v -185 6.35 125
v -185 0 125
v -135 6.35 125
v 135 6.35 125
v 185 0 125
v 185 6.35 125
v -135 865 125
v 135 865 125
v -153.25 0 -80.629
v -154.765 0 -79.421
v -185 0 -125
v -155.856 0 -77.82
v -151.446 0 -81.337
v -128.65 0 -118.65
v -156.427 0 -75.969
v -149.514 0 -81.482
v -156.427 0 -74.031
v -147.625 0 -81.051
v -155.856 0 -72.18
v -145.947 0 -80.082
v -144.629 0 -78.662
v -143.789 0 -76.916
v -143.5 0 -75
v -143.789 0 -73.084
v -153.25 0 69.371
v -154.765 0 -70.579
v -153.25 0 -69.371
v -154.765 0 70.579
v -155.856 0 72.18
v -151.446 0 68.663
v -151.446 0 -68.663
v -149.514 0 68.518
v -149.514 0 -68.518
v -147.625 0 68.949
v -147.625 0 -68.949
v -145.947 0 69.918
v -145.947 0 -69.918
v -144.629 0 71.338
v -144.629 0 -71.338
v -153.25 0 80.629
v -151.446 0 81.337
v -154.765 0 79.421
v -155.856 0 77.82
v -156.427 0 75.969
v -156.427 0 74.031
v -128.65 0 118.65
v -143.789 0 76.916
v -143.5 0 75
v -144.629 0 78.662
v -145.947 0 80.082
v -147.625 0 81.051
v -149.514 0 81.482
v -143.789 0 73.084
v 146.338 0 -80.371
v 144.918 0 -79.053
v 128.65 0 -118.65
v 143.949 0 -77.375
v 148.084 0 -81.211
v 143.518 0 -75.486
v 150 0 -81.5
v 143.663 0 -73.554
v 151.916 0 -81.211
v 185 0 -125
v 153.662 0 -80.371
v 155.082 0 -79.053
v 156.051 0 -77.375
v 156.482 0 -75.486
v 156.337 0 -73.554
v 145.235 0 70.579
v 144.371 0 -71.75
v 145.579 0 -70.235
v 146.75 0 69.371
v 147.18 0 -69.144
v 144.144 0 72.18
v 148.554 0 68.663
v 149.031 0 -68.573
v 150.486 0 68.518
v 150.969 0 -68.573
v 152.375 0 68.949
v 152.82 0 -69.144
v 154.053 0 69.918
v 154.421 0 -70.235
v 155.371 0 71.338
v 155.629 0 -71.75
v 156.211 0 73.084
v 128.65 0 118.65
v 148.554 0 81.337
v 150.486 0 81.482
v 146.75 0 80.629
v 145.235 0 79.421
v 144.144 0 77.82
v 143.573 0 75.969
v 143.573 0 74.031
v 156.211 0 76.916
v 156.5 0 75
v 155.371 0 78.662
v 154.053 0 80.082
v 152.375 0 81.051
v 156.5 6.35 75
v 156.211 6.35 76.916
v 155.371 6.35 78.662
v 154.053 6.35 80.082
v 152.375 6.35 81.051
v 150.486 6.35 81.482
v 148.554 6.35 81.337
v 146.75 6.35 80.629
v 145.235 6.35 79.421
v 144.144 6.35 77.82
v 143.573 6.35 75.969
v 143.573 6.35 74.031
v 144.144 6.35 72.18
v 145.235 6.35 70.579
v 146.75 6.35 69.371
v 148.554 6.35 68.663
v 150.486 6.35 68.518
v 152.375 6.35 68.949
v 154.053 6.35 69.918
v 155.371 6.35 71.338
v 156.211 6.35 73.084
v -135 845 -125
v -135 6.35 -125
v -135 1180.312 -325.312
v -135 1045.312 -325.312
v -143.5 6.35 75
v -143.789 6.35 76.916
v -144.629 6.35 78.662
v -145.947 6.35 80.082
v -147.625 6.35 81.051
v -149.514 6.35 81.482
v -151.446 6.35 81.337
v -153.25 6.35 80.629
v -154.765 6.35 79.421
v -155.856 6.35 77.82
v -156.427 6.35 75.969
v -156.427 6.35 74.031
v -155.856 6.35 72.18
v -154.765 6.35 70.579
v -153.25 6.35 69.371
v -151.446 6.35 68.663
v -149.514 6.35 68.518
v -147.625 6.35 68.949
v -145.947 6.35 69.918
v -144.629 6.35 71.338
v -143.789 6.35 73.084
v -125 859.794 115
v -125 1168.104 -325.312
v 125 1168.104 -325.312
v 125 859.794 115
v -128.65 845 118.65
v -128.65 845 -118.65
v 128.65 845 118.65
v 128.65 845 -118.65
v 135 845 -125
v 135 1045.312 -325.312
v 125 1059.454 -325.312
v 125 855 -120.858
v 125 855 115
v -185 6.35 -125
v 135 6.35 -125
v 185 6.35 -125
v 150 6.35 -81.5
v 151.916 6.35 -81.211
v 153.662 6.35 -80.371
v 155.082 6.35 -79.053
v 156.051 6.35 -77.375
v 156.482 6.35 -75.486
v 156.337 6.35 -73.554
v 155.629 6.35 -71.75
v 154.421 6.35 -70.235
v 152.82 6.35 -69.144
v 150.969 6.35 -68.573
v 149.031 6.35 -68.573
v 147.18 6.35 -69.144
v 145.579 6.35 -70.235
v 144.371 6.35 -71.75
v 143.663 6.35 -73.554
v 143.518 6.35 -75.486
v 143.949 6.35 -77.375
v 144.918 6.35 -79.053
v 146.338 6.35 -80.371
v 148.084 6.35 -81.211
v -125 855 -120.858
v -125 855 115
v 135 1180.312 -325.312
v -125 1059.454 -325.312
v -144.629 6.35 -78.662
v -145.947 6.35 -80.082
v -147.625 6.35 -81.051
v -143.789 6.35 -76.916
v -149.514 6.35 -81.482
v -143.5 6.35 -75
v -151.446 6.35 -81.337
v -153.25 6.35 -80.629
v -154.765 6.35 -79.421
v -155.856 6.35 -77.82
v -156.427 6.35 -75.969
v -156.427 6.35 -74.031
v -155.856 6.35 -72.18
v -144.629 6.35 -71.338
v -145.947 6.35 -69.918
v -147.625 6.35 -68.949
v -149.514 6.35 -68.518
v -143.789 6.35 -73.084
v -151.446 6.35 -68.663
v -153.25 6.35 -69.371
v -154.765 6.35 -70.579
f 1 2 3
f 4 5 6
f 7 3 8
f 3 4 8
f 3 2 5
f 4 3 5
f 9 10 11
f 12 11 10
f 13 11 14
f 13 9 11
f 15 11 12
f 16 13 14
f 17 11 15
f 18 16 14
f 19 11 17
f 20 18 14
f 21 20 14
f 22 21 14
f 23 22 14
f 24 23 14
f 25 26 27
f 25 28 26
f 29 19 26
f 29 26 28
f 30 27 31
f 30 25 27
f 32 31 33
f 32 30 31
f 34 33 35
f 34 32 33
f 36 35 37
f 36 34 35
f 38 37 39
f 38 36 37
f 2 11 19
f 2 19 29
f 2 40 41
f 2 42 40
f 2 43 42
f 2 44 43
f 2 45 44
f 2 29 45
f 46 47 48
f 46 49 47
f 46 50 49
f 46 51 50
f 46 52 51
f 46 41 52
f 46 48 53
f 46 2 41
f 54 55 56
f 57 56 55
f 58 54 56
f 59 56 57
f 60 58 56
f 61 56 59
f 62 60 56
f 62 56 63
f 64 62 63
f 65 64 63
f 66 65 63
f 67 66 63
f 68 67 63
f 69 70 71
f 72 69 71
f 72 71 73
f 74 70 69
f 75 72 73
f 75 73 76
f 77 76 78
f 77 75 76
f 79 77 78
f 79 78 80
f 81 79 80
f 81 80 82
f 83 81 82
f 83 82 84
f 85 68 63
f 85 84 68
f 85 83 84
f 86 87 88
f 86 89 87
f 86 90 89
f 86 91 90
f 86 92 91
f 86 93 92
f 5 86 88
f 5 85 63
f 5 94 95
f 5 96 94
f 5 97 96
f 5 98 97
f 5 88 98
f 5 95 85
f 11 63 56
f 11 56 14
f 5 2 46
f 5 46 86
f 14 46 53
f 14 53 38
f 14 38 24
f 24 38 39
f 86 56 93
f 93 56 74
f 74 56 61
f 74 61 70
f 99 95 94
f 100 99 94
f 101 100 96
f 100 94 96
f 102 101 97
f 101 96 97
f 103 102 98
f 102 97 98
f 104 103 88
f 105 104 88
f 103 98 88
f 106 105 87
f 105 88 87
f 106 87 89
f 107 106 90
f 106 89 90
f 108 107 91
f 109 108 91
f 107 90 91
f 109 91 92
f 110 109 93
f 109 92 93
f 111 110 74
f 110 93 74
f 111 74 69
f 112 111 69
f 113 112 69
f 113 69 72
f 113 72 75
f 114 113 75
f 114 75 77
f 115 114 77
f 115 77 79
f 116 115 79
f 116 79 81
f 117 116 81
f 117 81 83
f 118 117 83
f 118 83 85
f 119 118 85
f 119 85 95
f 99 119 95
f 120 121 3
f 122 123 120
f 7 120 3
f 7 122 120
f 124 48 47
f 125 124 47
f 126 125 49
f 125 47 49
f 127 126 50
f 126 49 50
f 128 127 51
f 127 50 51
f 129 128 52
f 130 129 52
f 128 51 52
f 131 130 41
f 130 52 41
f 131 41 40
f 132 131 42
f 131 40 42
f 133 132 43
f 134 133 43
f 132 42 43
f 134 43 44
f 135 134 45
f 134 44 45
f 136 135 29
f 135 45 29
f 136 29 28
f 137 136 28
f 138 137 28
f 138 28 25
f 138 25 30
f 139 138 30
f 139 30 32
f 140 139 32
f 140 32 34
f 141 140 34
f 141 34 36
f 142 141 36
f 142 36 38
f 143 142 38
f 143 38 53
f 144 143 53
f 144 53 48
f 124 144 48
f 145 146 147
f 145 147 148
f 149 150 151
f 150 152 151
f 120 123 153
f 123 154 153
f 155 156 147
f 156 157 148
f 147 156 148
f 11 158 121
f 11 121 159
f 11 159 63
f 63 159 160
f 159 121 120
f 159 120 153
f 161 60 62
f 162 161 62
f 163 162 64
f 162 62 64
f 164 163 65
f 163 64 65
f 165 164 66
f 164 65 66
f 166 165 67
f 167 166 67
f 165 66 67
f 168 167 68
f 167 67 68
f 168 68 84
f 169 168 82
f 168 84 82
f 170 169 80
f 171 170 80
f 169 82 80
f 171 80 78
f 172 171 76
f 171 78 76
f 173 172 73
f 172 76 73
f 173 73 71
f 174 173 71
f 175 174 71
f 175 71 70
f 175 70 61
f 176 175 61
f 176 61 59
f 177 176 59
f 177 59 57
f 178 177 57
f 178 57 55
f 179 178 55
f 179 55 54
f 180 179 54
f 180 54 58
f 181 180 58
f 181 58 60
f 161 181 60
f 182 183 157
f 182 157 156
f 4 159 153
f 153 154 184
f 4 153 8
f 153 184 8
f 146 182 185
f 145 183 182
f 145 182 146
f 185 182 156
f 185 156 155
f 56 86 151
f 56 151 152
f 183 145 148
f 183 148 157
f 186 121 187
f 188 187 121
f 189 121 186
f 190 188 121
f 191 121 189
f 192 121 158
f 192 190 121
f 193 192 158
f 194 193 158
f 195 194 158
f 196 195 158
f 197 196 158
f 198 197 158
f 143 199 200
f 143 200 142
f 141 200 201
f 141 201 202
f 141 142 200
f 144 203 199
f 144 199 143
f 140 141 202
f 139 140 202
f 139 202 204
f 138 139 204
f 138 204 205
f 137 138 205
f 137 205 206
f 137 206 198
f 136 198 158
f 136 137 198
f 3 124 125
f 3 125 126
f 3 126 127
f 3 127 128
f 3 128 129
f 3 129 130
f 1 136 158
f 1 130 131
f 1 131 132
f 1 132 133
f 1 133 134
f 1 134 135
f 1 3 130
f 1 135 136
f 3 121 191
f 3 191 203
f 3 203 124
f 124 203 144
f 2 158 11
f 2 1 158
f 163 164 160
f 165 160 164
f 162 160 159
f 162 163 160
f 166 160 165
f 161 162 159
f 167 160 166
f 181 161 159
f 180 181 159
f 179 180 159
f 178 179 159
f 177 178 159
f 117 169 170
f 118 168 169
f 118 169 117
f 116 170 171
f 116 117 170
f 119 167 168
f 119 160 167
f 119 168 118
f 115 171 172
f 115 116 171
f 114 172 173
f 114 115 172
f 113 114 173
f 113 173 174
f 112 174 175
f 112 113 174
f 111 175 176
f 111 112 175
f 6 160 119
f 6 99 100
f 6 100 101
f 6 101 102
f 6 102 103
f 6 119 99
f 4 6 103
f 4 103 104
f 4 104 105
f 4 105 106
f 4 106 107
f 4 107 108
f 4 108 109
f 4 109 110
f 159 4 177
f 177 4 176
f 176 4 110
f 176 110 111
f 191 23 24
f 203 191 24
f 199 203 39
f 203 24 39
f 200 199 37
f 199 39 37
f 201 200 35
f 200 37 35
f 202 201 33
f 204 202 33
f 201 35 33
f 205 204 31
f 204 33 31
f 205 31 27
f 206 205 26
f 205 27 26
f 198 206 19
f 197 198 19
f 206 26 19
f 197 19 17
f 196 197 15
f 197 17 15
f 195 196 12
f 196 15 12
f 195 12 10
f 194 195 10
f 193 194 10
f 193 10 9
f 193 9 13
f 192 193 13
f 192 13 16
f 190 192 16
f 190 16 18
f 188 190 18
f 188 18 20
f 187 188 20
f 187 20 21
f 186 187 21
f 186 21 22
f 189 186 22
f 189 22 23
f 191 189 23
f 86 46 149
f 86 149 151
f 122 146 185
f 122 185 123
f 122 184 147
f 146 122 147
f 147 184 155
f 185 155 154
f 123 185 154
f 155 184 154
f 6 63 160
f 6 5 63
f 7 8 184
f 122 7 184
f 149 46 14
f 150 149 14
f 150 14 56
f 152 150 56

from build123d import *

# Parameters (mm, degrees)
BOSS_EXTRUDE1_DEPTH = 125
SKETCH3_W           = 257.3
SKETCH3_H           = 237.3
CUT_EXTRUDE1_DEPTH  = 1000
BOSS_EXTRUDE2_DEPTH = 135
SHELL1_START        = -125
SHELL1_DEPTH        = 250
SKETCH6_R           = 6.5
CUT_EXTRUDE2_DEPTH  = 30


# Read off the part's stored shape, not the designer's step: Shell1
with BuildPart() as part:
    # Sketch2 → Boss-Extrude1 (new, symmetric)
    with BuildSketch(Plane.XY):
        Polygon((-135, 0), (135, 0), (185, 0), (185, 6.35), (135, 6.35), (135, 845), (-135, 845), (-135, 6.35), (-185, 6.35), (-185, 0), align=None)
    extrude(amount=BOSS_EXTRUDE1_DEPTH, both=True)

    # Sketch3 → Cut-Extrude1 (cut)
    with BuildSketch(Plane(origin=(0, 845, 0), x_dir=(1, 0, 0), z_dir=(0, 1, 0))):
        Rectangle(SKETCH3_W, SKETCH3_H)
    extrude(amount=-CUT_EXTRUDE1_DEPTH, mode=Mode.SUBTRACT)

    # Sketch5 → Boss-Extrude2 (add, symmetric)
    with BuildSketch(Plane(origin=(0, 0, 0), x_dir=(0, 0, -1), z_dir=(1, 0, 0))):
        Polygon((-125, 865), (325.311522824, 1180.311522824), (325.311522824, 1045.311522824), (125, 845), (-125, 845), align=None)
    extrude(amount=BOSS_EXTRUDE2_DEPTH, both=True)

    # Shell1 outline → Shell1 (cut)
    with BuildSketch(Plane.YZ.offset(SHELL1_START)):
        Polygon((855, 115), (855, -120.857864376), (1059.453658448, -325.311522824), (1168.103776937, -325.311522824), (859.794329494, 115), align=None)
    extrude(amount=SHELL1_DEPTH, mode=Mode.SUBTRACT)

    # Sketch6 → Cut-Extrude2 (cut)
    with BuildSketch(Plane.XZ):
        with Locations((150, 75)):
            Circle(SKETCH6_R)
        with Locations(Location((150, -75, 0), (0, 0, 270))):
            Circle(SKETCH6_R)
        with Locations((-150, 75)):
            Circle(SKETCH6_R)
        with Locations((-150, -75)):
            Circle(SKETCH6_R)
    extrude(amount=-CUT_EXTRUDE2_DEPTH, mode=Mode.SUBTRACT)


solid = part.part
